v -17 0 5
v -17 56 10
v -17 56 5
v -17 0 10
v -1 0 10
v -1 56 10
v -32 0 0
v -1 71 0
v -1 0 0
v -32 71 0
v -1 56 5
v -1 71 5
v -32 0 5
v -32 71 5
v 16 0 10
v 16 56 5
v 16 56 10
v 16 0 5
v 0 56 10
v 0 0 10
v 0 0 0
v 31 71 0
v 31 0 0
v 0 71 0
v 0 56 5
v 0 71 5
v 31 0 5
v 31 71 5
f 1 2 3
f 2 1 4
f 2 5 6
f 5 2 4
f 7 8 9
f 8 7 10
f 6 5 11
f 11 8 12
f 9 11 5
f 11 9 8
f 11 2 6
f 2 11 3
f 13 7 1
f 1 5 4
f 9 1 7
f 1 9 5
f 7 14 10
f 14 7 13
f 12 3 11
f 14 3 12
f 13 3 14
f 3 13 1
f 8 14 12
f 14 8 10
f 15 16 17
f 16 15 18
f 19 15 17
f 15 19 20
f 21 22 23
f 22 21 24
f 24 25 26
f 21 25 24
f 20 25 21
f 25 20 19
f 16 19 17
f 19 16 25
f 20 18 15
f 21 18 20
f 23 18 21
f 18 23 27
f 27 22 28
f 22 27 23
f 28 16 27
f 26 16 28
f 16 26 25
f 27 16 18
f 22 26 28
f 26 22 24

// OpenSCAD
x=16;
y=56;


cube([x,y,10]);
cube([x+15,y+15,5]);


mirror([1,0,0]) translate([1,0,0]) {
    
    cube([x,y,10]);
    cube([x+15,y+15,5]);
}
